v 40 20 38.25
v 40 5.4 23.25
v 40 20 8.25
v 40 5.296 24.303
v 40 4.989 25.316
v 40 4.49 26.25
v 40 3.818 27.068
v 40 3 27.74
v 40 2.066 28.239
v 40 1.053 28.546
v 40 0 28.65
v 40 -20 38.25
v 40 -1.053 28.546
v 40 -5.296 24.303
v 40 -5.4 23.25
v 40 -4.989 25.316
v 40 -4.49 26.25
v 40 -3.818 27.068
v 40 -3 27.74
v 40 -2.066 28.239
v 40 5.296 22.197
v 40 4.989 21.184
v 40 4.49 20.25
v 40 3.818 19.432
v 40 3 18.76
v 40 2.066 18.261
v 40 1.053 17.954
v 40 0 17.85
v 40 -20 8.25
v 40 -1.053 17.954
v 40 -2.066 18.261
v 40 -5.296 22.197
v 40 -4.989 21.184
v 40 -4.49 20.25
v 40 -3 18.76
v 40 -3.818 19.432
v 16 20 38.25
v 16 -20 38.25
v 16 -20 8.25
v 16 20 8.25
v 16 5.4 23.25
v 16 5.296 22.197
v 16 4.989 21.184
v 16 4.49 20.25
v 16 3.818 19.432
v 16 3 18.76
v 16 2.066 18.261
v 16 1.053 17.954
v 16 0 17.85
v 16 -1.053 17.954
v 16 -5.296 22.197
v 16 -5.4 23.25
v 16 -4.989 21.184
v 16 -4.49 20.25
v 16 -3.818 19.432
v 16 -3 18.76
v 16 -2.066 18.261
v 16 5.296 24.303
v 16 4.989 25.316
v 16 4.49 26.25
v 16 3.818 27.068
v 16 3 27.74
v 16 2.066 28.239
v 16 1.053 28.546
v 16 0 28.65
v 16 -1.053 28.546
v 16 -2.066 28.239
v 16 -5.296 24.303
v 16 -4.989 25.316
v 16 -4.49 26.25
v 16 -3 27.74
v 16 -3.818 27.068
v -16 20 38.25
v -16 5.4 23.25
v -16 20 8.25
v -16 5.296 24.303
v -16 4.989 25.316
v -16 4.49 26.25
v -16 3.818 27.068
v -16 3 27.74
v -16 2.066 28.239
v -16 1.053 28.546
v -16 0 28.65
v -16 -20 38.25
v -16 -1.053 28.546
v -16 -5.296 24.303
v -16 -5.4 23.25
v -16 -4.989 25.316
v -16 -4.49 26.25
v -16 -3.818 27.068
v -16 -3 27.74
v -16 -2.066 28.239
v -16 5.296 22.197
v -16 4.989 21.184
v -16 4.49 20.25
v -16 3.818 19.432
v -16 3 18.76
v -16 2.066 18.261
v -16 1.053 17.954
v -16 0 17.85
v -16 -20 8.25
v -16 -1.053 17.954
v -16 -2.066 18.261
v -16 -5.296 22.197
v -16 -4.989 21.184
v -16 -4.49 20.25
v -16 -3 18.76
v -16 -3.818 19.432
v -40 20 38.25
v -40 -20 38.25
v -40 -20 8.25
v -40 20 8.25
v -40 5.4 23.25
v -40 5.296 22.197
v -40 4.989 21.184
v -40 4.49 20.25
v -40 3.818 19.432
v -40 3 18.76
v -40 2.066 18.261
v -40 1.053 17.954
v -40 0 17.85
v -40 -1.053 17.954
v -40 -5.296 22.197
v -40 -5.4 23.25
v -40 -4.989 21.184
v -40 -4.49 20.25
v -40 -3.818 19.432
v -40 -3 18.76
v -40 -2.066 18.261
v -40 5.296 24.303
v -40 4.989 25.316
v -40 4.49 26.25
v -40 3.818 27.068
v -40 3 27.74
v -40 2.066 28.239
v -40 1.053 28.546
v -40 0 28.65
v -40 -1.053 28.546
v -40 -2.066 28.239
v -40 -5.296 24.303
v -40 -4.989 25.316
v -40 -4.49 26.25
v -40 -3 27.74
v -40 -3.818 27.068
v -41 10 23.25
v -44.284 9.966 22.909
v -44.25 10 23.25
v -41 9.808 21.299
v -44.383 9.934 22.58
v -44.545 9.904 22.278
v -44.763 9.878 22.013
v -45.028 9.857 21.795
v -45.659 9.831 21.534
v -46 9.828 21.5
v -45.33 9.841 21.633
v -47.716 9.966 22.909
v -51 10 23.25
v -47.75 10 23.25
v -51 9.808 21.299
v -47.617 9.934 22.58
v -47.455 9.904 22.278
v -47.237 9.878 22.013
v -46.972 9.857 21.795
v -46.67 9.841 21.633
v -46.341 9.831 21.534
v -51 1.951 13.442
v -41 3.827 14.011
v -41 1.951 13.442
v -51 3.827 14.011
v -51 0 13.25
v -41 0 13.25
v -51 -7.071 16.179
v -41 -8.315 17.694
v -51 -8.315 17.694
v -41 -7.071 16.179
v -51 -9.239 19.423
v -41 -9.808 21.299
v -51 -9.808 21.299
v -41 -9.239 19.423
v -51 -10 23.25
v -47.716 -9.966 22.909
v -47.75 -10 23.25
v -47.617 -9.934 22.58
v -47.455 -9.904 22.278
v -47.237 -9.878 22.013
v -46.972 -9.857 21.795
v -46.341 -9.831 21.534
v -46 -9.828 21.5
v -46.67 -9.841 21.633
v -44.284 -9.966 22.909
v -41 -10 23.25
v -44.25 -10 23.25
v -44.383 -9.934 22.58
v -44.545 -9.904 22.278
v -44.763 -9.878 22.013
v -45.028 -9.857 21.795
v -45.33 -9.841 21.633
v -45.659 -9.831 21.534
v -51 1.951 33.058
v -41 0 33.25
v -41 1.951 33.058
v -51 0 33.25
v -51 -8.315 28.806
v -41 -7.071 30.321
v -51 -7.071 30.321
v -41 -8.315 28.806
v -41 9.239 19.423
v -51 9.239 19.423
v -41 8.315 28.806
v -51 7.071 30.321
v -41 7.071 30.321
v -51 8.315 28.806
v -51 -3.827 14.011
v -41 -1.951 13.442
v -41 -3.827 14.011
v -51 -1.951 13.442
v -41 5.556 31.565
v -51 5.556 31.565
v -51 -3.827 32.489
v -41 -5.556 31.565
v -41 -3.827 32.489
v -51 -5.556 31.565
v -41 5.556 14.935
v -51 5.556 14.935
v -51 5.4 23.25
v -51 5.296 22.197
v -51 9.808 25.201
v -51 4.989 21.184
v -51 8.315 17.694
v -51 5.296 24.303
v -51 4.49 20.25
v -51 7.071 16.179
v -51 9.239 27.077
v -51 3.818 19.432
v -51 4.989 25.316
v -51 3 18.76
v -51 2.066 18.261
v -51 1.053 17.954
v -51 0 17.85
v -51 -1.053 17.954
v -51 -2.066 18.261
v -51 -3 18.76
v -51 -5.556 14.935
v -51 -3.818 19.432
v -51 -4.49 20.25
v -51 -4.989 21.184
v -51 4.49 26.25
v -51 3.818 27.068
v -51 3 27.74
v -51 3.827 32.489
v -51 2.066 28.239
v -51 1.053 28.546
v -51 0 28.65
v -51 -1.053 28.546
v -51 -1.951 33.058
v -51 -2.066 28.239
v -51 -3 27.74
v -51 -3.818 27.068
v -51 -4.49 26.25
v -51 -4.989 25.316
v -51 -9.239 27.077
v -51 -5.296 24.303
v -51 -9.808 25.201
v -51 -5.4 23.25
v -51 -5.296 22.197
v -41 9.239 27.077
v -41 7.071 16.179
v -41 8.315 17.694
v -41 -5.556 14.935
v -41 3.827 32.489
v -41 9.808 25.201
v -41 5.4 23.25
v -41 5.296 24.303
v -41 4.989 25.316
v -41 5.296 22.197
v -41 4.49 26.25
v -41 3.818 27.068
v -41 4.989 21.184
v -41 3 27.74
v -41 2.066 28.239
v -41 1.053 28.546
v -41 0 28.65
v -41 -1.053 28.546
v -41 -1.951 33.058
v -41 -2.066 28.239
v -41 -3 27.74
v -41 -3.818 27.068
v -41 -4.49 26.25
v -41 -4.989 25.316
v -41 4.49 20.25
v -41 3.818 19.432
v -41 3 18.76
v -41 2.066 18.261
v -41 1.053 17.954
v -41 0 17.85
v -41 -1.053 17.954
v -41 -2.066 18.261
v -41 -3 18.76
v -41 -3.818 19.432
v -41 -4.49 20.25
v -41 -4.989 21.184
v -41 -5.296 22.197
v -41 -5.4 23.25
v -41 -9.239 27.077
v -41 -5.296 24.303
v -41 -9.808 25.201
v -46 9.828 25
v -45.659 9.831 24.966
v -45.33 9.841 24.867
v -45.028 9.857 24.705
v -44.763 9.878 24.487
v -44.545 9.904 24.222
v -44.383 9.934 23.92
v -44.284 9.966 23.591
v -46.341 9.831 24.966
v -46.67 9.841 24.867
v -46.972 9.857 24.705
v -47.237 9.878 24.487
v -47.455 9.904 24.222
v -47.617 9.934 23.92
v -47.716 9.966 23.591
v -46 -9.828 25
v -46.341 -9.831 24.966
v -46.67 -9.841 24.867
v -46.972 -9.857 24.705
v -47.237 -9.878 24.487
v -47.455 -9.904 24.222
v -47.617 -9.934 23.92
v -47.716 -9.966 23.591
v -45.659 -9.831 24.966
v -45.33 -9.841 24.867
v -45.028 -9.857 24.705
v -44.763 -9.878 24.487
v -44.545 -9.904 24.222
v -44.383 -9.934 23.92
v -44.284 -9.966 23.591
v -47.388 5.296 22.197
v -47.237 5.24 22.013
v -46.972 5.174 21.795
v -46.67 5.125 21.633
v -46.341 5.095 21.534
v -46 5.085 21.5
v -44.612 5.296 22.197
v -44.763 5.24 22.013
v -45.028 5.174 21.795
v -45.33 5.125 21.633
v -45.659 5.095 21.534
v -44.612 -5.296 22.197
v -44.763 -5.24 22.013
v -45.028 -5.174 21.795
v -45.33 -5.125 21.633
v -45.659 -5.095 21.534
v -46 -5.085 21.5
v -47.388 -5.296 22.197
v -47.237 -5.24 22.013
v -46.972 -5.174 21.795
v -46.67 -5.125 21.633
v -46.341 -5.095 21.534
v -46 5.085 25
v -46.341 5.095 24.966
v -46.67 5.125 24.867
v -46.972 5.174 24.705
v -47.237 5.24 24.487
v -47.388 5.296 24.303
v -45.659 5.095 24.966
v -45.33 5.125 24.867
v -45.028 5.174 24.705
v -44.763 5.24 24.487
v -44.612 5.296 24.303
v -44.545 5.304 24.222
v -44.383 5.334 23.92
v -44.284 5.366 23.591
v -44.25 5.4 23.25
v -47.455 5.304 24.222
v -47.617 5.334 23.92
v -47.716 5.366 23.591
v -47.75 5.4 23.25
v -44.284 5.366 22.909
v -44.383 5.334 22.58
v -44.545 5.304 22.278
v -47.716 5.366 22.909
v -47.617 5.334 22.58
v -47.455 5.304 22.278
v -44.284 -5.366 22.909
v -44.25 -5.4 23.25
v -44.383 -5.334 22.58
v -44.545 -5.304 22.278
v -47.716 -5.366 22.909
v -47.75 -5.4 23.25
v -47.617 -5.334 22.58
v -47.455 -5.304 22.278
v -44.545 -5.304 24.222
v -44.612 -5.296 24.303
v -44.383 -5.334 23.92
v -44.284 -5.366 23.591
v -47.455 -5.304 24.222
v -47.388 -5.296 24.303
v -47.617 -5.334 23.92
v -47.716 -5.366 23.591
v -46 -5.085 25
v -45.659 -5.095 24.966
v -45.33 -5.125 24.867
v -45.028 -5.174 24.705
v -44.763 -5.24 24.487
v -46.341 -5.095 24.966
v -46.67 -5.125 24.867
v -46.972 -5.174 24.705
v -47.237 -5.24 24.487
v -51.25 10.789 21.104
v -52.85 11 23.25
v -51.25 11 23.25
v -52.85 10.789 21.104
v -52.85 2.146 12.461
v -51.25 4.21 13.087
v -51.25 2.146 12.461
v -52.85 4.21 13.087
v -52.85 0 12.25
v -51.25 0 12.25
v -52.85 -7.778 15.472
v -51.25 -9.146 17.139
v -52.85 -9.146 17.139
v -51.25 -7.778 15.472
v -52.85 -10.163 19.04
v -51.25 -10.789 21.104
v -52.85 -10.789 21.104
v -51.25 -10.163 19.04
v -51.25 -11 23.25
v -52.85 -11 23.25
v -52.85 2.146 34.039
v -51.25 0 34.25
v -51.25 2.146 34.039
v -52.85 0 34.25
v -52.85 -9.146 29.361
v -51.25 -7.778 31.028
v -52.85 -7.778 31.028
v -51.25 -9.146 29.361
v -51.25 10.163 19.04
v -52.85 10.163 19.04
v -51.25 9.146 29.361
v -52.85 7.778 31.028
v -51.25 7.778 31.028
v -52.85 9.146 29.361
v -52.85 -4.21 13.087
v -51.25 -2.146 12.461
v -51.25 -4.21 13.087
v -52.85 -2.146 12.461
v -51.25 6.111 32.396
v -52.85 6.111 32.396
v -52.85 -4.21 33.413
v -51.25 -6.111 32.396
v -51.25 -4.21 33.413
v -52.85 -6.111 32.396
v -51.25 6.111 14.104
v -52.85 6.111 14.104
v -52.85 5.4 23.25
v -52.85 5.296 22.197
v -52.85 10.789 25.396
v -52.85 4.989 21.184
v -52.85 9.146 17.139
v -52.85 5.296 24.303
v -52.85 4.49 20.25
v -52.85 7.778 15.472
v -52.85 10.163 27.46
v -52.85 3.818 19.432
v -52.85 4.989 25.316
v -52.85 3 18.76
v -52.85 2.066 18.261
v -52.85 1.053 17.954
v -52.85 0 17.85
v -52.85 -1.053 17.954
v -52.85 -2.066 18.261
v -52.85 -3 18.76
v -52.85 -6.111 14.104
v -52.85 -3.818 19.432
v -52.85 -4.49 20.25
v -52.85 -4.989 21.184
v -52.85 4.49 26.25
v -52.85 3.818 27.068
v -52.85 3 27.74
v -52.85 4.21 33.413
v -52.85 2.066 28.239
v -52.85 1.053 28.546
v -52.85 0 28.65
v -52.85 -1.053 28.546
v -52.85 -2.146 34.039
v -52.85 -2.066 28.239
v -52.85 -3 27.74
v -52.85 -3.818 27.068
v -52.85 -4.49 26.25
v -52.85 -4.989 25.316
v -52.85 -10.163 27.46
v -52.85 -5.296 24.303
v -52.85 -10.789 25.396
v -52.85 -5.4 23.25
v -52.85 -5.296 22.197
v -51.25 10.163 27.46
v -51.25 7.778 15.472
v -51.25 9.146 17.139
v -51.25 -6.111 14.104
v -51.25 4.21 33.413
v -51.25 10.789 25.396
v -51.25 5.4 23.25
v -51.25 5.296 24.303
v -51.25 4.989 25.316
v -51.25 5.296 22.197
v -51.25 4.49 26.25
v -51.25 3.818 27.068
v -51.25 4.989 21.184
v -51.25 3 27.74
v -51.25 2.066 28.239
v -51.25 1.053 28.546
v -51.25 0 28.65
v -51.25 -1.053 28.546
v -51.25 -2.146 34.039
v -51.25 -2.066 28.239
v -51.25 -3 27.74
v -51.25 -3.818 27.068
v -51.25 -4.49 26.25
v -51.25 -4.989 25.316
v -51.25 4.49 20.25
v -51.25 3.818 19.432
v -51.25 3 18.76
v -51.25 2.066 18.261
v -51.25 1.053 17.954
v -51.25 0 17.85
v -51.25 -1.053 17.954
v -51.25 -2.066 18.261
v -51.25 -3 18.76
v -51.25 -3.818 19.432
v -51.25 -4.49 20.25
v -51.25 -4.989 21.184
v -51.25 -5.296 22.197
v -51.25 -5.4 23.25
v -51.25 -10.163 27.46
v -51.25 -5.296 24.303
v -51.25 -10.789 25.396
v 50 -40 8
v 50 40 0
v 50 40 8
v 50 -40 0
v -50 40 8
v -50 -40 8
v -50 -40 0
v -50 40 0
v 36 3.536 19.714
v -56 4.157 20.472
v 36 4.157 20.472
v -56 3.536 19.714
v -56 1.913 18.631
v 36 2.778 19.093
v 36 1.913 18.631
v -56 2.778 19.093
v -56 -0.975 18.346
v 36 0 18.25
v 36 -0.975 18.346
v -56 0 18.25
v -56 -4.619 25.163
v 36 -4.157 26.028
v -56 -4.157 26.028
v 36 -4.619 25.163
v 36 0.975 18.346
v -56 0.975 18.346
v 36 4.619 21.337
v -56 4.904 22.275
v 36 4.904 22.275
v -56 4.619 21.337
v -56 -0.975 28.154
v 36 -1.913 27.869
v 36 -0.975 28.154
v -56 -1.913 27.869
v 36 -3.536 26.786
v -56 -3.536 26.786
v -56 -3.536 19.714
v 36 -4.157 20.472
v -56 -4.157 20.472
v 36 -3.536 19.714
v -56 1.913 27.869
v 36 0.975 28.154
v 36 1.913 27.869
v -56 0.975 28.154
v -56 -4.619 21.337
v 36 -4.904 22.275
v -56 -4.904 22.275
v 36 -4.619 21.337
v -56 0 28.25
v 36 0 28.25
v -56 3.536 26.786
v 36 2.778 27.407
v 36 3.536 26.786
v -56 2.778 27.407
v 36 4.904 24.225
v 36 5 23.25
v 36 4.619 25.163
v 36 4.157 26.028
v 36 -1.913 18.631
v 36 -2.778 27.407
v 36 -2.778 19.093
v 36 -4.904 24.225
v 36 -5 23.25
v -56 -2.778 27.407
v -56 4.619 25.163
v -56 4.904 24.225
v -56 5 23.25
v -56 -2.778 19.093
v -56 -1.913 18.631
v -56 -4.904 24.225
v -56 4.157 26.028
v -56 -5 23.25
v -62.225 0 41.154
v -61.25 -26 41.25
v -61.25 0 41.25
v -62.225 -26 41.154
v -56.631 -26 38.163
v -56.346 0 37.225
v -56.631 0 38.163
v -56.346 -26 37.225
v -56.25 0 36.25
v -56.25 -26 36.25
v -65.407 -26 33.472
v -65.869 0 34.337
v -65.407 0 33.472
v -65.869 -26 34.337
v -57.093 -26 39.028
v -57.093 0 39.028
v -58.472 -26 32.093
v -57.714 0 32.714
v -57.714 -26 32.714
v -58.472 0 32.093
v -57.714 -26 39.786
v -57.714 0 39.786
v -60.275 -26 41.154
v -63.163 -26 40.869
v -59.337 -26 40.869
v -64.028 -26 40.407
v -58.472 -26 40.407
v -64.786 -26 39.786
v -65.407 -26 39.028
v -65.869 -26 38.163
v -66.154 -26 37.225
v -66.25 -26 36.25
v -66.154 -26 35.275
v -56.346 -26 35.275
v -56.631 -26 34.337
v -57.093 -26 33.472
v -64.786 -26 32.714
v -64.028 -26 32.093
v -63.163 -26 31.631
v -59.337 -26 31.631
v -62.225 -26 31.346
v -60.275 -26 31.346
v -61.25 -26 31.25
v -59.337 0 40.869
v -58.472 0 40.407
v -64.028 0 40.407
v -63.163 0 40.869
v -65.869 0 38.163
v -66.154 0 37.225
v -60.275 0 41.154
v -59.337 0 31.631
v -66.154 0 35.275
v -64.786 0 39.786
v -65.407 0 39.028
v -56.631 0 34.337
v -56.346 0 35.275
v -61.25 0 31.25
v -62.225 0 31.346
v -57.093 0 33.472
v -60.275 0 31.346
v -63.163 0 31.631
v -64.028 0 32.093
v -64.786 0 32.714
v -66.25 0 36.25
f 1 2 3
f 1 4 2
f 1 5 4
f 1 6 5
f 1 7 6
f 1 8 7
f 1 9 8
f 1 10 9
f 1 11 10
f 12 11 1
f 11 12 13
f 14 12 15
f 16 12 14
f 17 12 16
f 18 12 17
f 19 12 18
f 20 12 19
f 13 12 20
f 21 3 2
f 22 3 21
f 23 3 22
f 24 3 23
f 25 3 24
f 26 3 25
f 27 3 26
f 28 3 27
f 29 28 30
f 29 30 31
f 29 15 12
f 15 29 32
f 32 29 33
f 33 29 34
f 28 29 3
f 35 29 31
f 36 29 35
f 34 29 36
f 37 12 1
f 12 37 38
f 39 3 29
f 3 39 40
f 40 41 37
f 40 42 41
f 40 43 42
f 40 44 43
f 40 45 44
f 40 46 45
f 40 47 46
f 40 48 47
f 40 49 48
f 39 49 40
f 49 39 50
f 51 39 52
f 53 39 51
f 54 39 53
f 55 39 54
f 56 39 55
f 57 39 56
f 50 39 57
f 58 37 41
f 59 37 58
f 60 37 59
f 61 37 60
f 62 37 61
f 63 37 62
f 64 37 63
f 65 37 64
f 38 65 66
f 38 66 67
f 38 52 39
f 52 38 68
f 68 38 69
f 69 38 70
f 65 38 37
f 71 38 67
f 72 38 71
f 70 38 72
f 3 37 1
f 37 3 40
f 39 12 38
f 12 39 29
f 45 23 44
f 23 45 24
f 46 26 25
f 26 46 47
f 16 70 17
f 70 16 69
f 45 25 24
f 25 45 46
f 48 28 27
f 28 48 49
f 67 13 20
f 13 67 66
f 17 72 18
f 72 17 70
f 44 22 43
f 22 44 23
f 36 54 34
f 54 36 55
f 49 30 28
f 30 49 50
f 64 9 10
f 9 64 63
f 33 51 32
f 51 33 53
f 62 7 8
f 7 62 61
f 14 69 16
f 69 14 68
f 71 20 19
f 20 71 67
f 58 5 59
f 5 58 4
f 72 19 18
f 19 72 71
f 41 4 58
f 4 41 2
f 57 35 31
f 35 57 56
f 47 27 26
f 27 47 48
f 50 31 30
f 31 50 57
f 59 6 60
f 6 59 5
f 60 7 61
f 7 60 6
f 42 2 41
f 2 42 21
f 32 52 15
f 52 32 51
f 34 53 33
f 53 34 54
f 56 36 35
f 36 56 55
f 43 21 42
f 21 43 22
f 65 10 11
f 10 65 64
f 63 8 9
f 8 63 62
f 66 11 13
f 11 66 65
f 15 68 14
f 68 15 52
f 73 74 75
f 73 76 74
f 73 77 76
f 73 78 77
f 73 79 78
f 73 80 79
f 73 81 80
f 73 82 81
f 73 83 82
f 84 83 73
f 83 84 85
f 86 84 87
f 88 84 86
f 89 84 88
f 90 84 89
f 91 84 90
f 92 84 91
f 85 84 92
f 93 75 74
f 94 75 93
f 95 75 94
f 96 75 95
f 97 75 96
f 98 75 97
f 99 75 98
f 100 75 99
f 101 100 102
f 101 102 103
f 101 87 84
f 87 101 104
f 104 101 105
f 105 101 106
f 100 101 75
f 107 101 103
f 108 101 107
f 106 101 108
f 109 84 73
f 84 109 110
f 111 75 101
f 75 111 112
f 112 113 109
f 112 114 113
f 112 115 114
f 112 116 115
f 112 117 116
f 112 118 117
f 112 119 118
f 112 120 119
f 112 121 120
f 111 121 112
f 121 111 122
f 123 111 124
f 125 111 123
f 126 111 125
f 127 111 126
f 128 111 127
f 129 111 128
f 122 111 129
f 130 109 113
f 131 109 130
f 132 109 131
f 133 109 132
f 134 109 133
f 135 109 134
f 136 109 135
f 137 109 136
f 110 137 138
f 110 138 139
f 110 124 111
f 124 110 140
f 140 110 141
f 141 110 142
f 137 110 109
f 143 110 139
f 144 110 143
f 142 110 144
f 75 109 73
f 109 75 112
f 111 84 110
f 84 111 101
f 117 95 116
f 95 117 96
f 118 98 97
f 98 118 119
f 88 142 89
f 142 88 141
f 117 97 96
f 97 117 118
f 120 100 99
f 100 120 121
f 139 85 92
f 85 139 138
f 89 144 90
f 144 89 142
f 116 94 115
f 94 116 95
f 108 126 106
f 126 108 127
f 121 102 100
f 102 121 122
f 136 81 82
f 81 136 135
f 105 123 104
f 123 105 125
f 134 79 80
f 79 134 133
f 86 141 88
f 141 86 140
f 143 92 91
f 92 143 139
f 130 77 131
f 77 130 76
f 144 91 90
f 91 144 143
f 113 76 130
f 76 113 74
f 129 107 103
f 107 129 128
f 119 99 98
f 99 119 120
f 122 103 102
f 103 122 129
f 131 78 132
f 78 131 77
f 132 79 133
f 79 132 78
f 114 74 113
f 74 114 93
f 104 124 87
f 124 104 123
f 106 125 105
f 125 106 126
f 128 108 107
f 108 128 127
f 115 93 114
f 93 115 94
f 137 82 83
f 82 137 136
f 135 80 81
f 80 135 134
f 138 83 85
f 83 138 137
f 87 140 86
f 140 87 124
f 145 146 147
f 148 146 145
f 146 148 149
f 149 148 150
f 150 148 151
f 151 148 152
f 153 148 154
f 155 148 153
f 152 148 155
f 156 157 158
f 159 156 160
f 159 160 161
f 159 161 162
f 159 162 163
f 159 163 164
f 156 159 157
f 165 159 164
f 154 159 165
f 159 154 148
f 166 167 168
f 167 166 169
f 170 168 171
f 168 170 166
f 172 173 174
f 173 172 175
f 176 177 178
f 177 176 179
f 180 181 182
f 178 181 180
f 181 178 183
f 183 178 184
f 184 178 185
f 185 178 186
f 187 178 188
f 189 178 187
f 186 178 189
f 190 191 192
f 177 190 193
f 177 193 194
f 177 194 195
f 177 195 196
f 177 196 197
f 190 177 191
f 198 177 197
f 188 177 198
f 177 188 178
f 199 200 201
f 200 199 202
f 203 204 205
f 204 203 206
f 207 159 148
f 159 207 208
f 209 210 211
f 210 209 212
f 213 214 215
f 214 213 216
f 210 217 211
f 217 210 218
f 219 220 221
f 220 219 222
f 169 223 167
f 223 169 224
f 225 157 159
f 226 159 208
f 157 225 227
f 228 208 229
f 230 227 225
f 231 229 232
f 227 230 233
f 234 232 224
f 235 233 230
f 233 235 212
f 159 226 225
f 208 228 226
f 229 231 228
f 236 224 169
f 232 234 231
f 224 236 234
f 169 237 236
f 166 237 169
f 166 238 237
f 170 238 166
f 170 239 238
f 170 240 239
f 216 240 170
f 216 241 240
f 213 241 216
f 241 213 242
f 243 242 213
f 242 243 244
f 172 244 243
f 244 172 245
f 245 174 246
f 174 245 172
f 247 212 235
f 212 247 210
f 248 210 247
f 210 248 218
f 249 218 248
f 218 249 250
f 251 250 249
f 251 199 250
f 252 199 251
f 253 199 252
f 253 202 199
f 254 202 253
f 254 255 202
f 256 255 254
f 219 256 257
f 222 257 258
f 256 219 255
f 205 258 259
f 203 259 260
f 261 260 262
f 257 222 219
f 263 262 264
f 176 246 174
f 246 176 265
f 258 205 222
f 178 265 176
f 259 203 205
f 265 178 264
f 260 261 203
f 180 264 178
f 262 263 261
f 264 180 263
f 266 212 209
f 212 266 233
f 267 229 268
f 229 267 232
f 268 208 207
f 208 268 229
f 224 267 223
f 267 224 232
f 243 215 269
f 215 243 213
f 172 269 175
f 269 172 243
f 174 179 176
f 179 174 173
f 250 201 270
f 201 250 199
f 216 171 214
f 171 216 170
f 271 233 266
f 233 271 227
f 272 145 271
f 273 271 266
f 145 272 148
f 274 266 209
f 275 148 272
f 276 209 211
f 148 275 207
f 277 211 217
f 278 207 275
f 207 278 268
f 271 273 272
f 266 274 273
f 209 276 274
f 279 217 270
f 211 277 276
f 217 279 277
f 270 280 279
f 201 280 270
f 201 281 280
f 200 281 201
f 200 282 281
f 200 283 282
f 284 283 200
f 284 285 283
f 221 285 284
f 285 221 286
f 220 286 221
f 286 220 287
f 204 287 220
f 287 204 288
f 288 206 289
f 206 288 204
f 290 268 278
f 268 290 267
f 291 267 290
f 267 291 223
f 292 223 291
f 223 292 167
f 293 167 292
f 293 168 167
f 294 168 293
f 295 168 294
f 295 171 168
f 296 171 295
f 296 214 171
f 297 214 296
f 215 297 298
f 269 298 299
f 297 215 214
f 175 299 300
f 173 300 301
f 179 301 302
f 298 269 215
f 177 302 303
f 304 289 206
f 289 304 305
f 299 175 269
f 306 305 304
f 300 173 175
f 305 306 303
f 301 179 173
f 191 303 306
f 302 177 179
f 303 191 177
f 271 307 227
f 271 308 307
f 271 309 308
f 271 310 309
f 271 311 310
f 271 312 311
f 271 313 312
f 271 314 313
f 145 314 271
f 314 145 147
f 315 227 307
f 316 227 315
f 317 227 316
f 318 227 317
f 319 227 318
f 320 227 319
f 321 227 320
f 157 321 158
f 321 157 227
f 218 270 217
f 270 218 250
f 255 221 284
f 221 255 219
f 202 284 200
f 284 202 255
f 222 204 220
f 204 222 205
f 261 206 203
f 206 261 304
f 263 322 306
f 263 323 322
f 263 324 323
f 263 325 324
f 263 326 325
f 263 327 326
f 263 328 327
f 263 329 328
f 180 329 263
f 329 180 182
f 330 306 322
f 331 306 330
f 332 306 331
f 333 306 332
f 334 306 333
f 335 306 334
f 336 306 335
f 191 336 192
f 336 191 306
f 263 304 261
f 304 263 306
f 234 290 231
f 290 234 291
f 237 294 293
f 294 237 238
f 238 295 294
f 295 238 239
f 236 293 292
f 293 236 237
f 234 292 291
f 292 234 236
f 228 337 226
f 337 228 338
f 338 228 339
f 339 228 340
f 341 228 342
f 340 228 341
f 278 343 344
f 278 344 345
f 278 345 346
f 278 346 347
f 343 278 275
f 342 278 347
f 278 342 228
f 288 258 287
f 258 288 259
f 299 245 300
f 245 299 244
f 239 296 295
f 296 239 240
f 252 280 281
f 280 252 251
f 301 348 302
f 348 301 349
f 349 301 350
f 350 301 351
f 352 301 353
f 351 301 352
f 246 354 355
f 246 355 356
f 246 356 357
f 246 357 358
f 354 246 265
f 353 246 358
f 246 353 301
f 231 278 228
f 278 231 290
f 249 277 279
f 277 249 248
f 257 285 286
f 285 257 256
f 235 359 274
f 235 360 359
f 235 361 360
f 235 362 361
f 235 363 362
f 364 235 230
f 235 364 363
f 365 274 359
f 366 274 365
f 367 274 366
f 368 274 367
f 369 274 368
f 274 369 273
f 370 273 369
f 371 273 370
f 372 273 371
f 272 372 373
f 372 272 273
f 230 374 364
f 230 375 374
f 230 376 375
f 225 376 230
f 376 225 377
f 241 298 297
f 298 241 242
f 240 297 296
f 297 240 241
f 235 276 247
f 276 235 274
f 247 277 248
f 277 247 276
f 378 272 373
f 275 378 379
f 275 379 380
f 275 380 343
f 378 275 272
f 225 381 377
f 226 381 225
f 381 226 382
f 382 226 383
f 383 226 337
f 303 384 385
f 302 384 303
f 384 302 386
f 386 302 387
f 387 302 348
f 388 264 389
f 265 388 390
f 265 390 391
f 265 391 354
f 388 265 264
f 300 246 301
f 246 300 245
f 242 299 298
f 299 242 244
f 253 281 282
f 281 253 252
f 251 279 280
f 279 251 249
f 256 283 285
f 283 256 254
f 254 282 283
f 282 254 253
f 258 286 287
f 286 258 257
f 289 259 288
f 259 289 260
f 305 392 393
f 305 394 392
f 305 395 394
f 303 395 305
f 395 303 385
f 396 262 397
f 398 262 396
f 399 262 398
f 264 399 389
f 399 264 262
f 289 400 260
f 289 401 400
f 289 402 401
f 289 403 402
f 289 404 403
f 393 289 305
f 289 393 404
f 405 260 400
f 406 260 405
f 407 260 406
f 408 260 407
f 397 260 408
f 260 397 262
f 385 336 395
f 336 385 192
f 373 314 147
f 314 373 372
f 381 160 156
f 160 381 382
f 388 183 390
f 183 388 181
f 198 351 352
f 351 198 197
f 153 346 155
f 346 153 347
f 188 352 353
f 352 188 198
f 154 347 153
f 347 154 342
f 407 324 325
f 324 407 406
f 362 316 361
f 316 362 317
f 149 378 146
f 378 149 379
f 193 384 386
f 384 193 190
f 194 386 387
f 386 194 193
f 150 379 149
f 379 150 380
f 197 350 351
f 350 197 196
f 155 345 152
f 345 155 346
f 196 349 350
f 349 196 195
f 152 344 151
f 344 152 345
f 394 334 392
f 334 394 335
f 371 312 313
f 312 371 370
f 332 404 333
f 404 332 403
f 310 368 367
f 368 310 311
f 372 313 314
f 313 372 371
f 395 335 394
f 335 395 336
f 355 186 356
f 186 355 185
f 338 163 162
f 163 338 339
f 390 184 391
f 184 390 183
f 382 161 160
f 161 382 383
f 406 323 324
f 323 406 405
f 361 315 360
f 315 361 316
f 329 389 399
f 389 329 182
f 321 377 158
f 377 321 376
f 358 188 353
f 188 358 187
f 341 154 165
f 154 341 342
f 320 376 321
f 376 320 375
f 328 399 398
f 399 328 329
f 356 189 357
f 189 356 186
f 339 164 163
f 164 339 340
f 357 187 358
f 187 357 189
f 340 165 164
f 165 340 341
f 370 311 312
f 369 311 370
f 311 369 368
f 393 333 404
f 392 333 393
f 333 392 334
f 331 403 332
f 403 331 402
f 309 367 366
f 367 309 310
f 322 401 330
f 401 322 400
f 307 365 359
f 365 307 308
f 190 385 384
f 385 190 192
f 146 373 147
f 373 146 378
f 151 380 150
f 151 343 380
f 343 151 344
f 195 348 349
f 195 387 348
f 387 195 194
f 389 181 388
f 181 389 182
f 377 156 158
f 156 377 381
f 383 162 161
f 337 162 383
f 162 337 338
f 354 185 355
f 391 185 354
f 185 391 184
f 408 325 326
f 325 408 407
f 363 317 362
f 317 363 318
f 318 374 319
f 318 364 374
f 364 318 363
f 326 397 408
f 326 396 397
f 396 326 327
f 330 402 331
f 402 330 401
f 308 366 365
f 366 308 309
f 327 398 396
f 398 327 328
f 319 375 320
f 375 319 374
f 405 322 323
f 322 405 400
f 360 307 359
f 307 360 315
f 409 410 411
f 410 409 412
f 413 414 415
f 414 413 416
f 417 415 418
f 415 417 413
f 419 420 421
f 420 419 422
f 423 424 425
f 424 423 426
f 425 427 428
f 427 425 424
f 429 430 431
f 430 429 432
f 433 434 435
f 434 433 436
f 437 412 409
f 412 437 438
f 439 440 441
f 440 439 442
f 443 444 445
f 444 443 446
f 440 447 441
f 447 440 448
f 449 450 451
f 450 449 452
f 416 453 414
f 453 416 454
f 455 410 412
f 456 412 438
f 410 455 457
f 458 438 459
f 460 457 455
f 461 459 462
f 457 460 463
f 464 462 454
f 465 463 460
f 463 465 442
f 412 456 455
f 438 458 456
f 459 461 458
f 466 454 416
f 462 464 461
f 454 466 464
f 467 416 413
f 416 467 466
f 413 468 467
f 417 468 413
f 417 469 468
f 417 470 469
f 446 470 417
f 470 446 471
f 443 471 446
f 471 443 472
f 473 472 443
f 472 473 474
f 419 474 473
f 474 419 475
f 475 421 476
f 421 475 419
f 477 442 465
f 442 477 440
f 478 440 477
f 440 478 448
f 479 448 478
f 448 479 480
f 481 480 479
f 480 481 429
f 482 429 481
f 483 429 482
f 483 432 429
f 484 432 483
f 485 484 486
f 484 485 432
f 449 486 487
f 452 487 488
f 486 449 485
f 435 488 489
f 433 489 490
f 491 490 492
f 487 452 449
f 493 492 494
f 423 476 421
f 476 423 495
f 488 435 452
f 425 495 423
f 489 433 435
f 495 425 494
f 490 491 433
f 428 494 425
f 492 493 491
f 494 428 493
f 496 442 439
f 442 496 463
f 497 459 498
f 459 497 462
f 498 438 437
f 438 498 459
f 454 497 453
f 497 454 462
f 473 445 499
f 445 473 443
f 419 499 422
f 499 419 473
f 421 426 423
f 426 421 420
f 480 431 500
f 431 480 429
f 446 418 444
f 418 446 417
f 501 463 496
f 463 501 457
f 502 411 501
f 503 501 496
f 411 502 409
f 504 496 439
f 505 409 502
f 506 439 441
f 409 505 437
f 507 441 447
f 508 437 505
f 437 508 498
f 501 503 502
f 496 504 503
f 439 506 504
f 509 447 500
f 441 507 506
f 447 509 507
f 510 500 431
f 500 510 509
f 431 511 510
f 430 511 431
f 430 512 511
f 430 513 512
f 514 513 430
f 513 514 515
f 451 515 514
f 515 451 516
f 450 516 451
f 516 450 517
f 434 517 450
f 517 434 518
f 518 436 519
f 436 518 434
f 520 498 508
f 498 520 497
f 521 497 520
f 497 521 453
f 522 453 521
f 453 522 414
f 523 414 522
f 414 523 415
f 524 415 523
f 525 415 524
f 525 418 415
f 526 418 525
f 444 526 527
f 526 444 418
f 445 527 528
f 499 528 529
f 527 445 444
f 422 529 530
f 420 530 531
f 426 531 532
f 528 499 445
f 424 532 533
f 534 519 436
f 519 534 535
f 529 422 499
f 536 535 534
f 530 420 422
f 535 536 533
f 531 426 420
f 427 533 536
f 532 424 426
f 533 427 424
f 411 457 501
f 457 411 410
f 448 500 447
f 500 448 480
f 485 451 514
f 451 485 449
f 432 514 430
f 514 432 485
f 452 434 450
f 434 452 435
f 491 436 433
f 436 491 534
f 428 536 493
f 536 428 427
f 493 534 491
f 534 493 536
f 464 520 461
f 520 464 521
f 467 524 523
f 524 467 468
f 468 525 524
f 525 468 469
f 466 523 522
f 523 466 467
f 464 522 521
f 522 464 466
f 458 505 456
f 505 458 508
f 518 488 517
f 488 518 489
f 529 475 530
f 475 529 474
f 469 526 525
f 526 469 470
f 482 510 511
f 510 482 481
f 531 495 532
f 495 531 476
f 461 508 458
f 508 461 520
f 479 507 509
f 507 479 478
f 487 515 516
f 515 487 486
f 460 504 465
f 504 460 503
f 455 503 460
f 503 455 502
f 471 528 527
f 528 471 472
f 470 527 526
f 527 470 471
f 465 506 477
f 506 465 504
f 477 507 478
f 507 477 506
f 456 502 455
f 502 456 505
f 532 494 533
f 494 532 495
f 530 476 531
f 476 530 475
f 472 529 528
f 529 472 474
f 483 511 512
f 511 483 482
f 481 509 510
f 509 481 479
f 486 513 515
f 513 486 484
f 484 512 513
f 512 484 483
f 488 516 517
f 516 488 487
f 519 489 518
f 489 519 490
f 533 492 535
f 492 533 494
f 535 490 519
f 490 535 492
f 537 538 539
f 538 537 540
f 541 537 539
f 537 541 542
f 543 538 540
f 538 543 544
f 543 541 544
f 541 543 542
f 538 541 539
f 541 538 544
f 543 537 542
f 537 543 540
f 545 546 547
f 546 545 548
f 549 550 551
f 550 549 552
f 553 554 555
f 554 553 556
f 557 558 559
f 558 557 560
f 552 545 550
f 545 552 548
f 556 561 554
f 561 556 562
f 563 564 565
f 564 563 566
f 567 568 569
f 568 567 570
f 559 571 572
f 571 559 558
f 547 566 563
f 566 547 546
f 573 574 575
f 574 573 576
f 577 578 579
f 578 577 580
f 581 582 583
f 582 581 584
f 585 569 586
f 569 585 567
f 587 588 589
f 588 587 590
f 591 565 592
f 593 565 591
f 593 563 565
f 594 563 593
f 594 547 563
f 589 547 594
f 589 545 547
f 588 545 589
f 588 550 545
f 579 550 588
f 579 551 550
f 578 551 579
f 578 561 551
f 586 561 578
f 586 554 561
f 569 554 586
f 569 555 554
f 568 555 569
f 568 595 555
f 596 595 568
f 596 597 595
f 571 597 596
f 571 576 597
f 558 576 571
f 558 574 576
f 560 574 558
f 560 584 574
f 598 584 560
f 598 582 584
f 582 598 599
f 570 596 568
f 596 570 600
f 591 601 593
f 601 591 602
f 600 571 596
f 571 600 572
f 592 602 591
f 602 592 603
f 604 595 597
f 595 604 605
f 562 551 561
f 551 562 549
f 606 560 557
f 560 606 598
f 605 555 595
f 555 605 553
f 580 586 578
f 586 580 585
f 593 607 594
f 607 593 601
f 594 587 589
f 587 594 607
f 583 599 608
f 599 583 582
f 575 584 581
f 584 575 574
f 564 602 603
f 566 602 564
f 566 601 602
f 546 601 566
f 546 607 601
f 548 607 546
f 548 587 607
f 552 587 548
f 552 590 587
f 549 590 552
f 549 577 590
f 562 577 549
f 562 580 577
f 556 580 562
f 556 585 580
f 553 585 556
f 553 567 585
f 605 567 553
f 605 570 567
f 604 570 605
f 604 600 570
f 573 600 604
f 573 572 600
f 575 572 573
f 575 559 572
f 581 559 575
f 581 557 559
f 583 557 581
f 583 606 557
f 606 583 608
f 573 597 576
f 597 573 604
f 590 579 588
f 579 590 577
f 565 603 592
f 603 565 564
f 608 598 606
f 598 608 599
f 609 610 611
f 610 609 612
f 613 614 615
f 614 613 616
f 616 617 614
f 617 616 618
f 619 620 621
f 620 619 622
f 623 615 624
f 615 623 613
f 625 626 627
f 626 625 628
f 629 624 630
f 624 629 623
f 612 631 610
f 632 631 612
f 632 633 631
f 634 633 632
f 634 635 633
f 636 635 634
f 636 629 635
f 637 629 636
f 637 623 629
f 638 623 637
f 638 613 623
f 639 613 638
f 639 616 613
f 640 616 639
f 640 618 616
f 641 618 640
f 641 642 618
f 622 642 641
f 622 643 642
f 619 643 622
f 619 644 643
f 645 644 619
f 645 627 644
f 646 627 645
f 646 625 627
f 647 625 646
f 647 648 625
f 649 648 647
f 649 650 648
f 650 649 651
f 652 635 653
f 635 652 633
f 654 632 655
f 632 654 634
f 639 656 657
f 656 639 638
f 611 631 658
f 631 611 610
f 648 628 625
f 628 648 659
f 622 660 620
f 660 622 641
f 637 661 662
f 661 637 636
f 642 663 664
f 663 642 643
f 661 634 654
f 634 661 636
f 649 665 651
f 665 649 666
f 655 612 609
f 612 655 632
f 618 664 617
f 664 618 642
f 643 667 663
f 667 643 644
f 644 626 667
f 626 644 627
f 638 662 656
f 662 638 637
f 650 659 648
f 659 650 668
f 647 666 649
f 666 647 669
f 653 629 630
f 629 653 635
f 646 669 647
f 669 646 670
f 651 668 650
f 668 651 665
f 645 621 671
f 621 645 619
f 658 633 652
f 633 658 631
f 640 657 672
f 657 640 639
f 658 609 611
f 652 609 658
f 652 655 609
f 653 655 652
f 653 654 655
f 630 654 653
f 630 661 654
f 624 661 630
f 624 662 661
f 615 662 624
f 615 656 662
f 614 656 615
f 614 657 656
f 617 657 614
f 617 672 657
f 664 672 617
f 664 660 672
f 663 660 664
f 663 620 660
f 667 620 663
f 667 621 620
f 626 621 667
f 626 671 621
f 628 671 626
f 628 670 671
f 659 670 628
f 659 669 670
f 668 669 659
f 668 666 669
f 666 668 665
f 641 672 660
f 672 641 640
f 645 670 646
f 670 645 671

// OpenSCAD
$fn = 32;

// ------------------------------------------------------------------------
// Machine vise: screw d10, jaws 24 x 30 mm
// Every part is its own module, assembly() places every instance.
// ------------------------------------------------------------------------

// --- part 1 ---
module vise_bed() {
  difference() {
    translate([-50, -40, 0]) cube([100, 80, 8]);
  }
}

// --- part 2 ---
module vise_jaw() {
  difference() {
    translate([-12, -20, 0]) cube([24, 40, 30]);
    translate([0, 0, 15]) rotate([0, 90, 0]) cylinder(h = 26, d = 10.8, center = true);
  }
}

// --- part 3 ---
module vise_screw() {
  translate([0, 0, -46]) cylinder(h = 92, d = 10);
}

// --- part 4 ---
module screw_collar() {
  difference() {
    cylinder(h = 10, d = 20);
    translate([0, 0, -1]) cylinder(h = 12, d = 10.8);
    translate([0, 0, 5]) rotate([90, 0, 0]) cylinder(h = 22, d = 3.5, center = true);
  }
}

// --- part 5 ---
module screw_washer() {
  difference() {
      translate([0, 0, 0]) cylinder(h = 1.6, d = 22);
      translate([0, 0, -1]) cylinder(h = 3.6, d = 10.8);
    }
}

// --- part 6 ---
module vise_handle() {
  cylinder(h = 26, d = 10);
}

// --- assembly ---
module assembly() {
  color([0.80, 0.24, 0.20]) translate([0, 0, 0]) rotate([0, 0, 0]) vise_bed();
  color([0.20, 0.45, 0.75]) translate([28, 0, 8.25]) rotate([0, 0, 0]) vise_jaw();
  color([0.25, 0.62, 0.32]) translate([-28, 0, 8.25]) rotate([0, 0, 0]) vise_jaw();
  color([0.92, 0.70, 0.18]) translate([-10, 0, 23.25]) rotate([0, 90, 0]) vise_screw();
  color([0.58, 0.35, 0.70]) translate([-51, 0, 23.25]) rotate([0, 90, 0]) screw_collar();
  color([0.16, 0.66, 0.66]) translate([-52.85, 0, 23.25]) rotate([0, 90, 0]) screw_washer();
  color([0.85, 0.48, 0.18]) translate([-61.25, 0, 36.25]) rotate([90, 0, 0]) vise_handle();
}

assembly();
